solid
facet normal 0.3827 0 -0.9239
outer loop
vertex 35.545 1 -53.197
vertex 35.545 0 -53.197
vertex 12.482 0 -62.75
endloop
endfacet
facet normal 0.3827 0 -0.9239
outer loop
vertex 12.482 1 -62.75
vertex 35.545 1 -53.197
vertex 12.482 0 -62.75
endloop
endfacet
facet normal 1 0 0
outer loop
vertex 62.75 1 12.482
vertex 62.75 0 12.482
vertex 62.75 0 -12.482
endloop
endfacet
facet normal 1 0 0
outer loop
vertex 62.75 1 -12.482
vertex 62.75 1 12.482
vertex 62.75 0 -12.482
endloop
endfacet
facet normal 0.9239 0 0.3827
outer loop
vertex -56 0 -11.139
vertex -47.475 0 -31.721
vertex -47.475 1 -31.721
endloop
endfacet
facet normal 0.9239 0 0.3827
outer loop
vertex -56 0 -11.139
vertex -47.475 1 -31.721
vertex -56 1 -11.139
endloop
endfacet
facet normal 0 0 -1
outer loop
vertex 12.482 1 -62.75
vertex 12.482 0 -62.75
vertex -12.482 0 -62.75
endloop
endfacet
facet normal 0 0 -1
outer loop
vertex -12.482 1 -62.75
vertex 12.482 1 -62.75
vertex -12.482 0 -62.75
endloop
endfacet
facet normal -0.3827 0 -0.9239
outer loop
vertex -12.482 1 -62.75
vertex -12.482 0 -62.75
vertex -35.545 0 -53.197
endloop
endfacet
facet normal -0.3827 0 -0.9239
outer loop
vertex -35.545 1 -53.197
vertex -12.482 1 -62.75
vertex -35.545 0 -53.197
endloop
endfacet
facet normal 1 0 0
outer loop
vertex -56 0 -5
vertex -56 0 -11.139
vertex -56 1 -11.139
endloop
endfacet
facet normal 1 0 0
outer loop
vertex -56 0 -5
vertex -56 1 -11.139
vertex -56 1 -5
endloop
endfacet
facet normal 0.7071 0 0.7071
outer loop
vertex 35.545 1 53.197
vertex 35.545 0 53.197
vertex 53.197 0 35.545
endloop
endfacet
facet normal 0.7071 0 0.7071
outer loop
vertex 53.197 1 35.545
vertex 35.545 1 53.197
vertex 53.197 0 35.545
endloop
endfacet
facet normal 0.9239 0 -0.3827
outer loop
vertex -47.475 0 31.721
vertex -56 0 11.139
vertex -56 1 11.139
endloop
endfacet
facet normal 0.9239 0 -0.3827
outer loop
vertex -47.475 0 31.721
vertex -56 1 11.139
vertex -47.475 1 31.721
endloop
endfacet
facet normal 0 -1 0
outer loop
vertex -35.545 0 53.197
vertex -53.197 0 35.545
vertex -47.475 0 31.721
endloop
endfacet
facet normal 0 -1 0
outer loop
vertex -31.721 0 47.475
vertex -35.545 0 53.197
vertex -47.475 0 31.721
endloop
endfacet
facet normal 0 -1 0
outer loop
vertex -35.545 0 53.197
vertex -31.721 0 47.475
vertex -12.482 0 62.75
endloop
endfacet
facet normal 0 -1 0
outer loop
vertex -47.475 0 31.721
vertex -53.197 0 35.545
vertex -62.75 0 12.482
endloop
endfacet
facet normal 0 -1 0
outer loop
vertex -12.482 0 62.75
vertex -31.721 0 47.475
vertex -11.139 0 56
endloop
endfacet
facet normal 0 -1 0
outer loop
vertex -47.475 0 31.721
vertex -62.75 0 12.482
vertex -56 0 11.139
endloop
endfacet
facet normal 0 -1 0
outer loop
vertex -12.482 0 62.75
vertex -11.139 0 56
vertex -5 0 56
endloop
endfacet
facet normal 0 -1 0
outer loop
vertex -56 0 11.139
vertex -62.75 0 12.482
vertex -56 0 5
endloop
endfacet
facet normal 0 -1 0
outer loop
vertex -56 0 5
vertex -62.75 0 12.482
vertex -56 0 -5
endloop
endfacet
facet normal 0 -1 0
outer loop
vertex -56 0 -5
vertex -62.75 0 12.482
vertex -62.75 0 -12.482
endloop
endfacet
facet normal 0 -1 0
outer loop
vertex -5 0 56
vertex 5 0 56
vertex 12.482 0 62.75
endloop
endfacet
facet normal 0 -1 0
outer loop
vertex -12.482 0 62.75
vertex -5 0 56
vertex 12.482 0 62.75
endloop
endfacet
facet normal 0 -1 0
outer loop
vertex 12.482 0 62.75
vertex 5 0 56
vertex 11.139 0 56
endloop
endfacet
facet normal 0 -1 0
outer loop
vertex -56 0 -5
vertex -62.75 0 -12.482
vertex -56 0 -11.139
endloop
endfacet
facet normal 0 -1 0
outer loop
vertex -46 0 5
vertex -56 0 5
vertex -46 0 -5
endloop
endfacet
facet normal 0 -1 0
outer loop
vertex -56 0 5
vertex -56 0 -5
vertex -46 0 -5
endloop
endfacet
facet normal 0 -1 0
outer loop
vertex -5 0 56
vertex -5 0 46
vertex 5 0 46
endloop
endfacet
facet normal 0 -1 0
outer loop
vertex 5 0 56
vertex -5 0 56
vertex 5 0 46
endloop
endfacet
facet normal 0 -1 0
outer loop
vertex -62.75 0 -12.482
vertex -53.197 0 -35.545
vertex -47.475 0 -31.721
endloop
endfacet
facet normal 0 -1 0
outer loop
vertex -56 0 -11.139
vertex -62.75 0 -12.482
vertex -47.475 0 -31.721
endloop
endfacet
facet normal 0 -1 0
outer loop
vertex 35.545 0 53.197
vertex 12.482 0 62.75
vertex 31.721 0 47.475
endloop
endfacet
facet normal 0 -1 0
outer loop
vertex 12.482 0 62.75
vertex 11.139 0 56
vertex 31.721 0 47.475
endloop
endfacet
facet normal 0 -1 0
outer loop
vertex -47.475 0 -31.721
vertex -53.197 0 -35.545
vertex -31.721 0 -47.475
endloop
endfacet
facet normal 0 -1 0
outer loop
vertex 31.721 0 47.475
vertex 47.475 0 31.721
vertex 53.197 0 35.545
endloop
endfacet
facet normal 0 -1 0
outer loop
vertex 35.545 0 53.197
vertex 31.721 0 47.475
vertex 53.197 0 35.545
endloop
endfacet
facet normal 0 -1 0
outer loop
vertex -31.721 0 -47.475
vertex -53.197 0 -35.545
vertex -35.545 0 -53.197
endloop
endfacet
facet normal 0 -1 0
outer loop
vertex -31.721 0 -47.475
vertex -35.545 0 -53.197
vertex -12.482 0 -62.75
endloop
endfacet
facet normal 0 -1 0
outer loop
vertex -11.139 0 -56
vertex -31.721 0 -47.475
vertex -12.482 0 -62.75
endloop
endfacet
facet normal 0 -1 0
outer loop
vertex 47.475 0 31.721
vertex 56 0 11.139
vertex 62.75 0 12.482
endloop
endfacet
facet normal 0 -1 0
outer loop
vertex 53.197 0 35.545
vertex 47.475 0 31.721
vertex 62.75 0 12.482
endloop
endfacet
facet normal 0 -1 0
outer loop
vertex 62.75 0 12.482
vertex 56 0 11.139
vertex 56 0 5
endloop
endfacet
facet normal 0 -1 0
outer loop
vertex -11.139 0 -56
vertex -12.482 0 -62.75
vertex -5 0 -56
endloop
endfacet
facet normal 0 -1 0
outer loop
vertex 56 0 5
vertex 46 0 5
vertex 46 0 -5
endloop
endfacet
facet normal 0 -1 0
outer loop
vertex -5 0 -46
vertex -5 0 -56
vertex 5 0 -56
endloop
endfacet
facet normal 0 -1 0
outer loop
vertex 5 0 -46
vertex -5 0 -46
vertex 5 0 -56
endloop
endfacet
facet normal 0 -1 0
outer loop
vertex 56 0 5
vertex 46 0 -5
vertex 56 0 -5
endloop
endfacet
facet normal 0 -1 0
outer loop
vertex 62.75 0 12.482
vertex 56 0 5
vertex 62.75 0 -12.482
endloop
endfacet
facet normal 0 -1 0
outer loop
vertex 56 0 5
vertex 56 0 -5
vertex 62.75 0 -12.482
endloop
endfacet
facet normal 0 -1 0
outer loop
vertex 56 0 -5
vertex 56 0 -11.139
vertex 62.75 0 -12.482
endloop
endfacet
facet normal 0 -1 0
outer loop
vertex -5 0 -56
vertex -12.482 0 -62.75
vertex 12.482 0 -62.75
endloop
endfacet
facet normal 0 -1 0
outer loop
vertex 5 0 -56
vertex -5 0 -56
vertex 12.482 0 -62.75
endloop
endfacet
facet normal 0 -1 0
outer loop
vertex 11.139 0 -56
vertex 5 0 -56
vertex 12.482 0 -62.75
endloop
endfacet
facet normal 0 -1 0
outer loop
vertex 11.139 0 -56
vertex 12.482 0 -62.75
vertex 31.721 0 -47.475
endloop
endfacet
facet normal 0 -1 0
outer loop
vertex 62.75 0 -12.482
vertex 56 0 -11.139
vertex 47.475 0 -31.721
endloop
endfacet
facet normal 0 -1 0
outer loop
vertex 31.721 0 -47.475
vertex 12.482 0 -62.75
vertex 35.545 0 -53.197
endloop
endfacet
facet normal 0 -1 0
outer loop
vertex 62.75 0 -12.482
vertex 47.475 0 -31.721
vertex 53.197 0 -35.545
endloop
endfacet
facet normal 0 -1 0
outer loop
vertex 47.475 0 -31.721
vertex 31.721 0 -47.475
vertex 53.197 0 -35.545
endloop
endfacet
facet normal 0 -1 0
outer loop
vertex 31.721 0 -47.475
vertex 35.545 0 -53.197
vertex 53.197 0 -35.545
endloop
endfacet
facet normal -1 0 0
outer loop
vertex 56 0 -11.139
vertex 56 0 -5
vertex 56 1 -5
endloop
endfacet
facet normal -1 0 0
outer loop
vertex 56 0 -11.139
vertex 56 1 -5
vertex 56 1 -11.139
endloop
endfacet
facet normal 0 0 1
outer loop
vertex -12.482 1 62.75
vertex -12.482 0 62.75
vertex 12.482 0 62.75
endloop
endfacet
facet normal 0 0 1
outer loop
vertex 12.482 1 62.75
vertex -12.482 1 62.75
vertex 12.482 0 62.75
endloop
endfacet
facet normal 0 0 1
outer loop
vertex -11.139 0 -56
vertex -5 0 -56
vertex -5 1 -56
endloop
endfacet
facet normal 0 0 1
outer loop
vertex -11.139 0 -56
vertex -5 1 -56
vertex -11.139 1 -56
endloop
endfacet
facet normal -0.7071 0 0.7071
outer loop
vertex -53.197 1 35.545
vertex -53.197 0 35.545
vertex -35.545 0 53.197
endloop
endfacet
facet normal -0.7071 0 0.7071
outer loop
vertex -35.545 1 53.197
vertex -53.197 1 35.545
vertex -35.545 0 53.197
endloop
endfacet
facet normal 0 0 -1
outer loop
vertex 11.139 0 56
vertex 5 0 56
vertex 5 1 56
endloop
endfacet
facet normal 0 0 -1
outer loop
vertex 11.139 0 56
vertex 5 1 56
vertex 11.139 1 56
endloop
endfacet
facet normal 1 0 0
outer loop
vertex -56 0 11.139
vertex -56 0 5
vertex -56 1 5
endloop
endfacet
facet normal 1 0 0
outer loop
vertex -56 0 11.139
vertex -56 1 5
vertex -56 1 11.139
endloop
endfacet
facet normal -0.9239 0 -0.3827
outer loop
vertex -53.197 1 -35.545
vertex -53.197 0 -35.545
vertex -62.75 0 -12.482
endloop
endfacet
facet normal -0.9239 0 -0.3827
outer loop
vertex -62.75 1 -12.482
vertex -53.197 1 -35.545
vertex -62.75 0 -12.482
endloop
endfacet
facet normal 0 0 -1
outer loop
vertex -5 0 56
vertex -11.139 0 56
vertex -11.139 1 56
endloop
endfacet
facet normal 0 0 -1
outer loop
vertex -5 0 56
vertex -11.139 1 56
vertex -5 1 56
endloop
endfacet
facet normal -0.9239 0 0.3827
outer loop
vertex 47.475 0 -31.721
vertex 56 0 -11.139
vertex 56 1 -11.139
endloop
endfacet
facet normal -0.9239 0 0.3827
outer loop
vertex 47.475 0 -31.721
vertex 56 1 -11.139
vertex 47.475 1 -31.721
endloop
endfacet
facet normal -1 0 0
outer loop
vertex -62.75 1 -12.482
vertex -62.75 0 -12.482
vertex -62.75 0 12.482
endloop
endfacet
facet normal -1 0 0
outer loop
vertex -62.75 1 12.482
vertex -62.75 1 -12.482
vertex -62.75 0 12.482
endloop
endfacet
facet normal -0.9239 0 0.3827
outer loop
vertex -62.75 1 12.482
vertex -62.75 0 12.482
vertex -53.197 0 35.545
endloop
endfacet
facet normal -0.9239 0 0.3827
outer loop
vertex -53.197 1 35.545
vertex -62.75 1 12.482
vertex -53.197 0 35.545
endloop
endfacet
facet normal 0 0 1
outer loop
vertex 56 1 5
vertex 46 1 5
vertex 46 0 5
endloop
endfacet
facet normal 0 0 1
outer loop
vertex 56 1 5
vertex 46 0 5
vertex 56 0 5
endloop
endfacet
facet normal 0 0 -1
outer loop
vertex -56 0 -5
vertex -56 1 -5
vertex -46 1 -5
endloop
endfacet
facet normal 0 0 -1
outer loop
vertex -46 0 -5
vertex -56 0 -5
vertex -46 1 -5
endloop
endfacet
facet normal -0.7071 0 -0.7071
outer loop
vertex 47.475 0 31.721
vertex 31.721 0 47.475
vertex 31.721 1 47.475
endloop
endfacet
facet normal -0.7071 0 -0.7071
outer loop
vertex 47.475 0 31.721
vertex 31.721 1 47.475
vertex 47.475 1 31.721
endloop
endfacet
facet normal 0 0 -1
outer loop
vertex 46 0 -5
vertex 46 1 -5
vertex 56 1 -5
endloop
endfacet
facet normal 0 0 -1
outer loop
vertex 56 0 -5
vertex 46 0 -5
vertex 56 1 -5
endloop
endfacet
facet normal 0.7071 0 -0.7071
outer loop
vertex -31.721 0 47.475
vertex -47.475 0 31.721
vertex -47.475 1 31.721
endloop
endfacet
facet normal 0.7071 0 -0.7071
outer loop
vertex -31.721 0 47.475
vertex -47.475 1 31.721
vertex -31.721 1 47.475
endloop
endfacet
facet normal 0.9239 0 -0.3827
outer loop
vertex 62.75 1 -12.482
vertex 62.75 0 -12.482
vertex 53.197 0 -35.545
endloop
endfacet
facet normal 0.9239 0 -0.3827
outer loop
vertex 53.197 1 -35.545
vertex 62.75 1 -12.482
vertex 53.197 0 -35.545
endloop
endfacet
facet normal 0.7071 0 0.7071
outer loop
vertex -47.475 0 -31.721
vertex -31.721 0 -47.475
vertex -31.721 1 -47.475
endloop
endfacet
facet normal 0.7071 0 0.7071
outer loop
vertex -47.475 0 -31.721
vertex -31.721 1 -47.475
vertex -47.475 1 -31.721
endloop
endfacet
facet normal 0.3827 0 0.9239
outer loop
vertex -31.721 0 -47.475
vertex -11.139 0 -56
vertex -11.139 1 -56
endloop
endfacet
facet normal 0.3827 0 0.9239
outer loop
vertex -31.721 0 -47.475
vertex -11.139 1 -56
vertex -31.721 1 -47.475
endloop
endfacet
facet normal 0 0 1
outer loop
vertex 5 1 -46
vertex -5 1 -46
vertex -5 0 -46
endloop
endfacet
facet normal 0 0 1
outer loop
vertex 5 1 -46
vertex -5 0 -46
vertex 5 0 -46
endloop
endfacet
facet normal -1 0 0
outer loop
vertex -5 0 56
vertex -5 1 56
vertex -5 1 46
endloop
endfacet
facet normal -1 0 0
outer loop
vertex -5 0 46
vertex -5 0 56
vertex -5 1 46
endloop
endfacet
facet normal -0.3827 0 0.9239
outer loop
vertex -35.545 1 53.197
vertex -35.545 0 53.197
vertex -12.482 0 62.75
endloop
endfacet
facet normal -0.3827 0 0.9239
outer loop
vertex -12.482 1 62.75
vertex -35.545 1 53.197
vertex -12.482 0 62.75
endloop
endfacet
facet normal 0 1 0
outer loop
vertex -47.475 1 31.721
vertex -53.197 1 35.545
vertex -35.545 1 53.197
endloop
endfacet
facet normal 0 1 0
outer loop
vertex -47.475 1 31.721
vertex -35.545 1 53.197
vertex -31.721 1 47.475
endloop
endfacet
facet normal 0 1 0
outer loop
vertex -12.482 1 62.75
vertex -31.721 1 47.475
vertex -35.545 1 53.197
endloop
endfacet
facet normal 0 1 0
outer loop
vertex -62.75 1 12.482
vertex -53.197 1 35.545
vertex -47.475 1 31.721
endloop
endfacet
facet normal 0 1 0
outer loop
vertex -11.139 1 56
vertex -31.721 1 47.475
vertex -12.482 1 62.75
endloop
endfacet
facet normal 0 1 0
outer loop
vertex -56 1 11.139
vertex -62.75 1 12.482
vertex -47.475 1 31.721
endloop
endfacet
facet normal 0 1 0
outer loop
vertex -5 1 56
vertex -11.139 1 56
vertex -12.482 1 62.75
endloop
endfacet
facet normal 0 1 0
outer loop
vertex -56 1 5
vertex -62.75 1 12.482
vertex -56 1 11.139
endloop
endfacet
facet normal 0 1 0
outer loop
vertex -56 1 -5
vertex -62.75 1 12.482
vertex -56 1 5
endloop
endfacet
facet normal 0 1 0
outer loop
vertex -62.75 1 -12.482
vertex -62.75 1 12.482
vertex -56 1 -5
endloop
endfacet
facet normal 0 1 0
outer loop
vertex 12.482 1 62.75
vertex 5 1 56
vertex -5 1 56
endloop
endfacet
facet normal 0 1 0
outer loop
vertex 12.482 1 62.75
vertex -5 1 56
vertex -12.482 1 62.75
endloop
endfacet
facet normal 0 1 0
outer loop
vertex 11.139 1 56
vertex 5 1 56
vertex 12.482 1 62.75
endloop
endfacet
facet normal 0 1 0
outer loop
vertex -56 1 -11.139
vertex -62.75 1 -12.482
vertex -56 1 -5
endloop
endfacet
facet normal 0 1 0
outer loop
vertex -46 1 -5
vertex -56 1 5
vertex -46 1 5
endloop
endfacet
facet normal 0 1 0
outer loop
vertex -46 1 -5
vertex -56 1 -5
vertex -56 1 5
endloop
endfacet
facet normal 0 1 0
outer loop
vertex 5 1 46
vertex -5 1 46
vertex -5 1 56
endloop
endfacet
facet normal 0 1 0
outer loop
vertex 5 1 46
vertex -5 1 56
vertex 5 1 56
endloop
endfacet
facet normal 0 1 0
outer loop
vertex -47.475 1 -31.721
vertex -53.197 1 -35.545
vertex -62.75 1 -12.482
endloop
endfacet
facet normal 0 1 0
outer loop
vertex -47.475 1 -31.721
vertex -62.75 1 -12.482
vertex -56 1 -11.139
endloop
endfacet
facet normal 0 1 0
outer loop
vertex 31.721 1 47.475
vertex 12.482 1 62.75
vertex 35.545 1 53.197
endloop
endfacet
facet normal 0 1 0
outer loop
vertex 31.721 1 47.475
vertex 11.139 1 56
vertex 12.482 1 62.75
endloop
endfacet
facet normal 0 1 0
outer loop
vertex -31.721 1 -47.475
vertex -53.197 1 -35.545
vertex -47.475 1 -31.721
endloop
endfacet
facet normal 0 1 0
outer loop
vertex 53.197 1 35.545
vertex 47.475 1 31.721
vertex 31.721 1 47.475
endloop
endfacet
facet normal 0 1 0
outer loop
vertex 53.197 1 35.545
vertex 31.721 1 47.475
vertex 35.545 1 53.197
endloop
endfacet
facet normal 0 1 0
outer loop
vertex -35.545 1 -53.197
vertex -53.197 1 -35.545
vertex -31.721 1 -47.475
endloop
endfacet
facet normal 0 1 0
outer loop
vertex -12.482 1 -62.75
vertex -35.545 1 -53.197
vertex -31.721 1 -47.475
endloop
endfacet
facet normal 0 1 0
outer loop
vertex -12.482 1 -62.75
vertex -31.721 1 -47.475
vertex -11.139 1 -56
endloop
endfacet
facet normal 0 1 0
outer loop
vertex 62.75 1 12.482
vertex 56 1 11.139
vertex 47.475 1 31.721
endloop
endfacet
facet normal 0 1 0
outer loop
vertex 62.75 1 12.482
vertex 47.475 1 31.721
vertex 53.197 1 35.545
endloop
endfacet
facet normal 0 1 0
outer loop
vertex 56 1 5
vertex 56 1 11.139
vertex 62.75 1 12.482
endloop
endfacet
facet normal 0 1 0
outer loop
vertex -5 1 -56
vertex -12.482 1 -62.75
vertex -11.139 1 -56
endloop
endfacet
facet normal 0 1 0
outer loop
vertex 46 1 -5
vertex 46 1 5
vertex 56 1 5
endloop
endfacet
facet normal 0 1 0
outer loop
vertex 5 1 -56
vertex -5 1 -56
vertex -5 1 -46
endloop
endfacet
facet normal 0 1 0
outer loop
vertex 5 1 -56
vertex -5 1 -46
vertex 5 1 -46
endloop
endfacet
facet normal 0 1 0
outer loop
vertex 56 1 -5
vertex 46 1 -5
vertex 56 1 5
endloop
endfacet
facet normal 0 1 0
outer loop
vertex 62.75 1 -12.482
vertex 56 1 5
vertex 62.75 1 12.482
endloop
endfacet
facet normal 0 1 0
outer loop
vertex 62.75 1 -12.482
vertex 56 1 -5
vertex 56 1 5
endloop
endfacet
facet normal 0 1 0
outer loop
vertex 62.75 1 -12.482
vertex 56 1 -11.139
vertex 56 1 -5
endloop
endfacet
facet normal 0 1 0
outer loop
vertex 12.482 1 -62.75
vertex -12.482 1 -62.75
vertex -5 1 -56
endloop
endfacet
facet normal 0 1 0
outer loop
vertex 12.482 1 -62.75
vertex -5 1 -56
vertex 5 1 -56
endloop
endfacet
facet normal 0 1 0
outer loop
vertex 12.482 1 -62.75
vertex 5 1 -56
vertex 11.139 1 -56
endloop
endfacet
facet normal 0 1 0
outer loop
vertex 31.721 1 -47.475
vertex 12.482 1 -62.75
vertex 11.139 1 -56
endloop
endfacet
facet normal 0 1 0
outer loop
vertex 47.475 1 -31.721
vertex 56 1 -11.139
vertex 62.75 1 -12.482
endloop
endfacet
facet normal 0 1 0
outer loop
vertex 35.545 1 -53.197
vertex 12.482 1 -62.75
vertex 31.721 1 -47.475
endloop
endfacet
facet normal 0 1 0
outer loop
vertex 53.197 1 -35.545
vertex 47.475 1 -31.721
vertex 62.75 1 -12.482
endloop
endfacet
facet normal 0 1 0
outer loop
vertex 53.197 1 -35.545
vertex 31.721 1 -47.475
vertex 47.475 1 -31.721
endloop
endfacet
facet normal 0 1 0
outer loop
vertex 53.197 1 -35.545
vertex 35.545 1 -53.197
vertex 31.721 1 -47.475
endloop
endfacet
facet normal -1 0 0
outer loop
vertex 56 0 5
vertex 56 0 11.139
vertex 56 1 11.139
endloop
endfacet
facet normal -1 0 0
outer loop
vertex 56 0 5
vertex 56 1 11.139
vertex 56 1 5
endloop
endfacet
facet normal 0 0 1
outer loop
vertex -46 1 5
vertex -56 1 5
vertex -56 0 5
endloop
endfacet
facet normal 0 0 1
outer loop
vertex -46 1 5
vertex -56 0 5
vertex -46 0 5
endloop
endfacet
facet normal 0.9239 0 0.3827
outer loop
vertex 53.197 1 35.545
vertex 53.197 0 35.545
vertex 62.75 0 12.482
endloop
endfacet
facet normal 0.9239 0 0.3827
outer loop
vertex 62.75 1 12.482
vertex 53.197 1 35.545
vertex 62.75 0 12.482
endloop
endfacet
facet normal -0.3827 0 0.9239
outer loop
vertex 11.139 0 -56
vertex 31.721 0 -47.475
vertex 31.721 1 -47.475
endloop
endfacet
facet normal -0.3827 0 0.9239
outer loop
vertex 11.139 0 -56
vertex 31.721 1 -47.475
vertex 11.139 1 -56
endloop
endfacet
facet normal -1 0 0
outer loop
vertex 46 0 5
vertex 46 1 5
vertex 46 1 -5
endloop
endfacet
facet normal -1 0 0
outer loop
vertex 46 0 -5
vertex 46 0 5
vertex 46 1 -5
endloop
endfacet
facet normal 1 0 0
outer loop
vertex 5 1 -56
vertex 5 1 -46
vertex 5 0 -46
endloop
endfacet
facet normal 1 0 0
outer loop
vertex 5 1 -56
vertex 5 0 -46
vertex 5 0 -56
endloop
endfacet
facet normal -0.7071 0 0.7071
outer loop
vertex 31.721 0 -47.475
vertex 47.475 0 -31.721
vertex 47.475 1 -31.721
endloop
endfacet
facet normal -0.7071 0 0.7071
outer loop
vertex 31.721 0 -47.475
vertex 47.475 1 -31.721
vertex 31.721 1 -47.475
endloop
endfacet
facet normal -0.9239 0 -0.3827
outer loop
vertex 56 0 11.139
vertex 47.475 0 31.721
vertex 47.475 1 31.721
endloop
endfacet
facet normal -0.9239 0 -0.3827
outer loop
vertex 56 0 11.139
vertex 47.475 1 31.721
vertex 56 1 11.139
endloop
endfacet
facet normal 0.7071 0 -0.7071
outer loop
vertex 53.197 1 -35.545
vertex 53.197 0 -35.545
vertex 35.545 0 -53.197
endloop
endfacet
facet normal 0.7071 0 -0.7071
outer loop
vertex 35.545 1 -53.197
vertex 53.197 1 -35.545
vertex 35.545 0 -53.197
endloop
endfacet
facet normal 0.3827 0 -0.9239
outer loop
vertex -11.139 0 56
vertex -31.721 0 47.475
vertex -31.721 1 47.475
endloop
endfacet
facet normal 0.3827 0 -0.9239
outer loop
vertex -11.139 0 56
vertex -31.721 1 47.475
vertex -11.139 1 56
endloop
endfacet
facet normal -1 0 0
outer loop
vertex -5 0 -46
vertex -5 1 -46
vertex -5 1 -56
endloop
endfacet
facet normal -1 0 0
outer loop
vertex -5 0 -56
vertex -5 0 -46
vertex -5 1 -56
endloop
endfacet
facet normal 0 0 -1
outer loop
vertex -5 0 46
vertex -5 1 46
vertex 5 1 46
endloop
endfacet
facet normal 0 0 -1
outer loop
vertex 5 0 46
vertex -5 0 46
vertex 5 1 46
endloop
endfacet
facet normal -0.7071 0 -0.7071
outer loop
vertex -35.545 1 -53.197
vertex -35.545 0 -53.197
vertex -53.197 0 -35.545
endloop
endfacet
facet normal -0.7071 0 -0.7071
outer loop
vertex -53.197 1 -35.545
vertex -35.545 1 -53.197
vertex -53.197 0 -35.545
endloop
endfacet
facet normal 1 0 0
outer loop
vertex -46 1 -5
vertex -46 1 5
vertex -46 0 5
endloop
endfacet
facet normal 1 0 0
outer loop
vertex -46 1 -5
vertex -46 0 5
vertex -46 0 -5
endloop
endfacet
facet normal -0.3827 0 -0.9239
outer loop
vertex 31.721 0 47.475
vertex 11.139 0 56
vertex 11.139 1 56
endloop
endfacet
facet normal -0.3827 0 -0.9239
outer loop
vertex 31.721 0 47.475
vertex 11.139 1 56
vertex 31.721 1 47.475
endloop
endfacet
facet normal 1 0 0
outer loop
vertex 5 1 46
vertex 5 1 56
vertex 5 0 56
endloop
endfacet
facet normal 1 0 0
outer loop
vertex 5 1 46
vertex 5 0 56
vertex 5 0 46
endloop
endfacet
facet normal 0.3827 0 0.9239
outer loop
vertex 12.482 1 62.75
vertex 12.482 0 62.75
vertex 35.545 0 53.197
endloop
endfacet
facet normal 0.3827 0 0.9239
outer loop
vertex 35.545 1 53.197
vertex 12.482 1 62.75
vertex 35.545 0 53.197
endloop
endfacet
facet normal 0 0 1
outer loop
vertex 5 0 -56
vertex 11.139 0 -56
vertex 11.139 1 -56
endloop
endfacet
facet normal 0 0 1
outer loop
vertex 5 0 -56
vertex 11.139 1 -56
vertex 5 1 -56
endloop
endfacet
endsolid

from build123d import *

# Parameters (mm, degrees)
BOSS_EXTRUDE1_DEPTH = 1
SKETCH2_W           = 10
SKETCH2_H           = 10
BOSS_EXTRUDE2_DEPTH = 1


with BuildPart() as part:
    # Sketch1 → Boss-Extrude1 (new body)
    with BuildSketch(Plane(origin=(0, 0, 0), x_dir=(1, 0, 0), z_dir=(0, 1, 0))):
        Polygon((62.75, -12.481751053), (62.75, 12.481751053), (53.19688133, 35.545019709), (35.545019709, 53.19688133), (12.481751053, 62.75), (-12.481751053, 62.75), (-35.545019709, 53.19688133), (-53.19688133, 35.545019709), (-62.75, 12.481751053), (-62.75, -12.481751053), (-53.19688133, -35.545019709), (-35.545019709, -53.19688133), (-12.481751053, -62.75), (12.481751053, -62.75), (35.545019709, -53.19688133), (53.19688133, -35.545019709), align=None)
        Polygon((56, -11.139092573), (56, 11.139092573), (47.474507641, 31.721451852), (31.721451852, 47.474507641), (11.139092573, 56), (-11.139092573, 56), (-31.721451852, 47.474507641), (-47.474507641, 31.721451852), (-56, 11.139092573), (-56, -11.139092573), (-47.474507641, -31.721451852), (-31.721451852, -47.474507641), (-11.139092573, -56), (11.139092573, -56), (31.721451852, -47.474507641), (47.474507641, -31.721451852), align=None, mode=Mode.SUBTRACT)
    extrude(amount=BOSS_EXTRUDE1_DEPTH)

    # Sketch2 → Boss-Extrude2 (add)
    with BuildSketch(Plane(origin=(0, 1, 0), x_dir=(1, 0, 0), z_dir=(0, 1, 0))):
        with Locations((0, -51)):
            Rectangle(SKETCH2_W, SKETCH2_H)
        with Locations((-51, 0)):
            Rectangle(SKETCH2_W, SKETCH2_H)
        with Locations((0, 51)):
            Rectangle(SKETCH2_W, SKETCH2_H)
        with Locations((51, 0)):
            Rectangle(SKETCH2_W, SKETCH2_H)
    extrude(amount=-BOSS_EXTRUDE2_DEPTH)


solid = part.part
